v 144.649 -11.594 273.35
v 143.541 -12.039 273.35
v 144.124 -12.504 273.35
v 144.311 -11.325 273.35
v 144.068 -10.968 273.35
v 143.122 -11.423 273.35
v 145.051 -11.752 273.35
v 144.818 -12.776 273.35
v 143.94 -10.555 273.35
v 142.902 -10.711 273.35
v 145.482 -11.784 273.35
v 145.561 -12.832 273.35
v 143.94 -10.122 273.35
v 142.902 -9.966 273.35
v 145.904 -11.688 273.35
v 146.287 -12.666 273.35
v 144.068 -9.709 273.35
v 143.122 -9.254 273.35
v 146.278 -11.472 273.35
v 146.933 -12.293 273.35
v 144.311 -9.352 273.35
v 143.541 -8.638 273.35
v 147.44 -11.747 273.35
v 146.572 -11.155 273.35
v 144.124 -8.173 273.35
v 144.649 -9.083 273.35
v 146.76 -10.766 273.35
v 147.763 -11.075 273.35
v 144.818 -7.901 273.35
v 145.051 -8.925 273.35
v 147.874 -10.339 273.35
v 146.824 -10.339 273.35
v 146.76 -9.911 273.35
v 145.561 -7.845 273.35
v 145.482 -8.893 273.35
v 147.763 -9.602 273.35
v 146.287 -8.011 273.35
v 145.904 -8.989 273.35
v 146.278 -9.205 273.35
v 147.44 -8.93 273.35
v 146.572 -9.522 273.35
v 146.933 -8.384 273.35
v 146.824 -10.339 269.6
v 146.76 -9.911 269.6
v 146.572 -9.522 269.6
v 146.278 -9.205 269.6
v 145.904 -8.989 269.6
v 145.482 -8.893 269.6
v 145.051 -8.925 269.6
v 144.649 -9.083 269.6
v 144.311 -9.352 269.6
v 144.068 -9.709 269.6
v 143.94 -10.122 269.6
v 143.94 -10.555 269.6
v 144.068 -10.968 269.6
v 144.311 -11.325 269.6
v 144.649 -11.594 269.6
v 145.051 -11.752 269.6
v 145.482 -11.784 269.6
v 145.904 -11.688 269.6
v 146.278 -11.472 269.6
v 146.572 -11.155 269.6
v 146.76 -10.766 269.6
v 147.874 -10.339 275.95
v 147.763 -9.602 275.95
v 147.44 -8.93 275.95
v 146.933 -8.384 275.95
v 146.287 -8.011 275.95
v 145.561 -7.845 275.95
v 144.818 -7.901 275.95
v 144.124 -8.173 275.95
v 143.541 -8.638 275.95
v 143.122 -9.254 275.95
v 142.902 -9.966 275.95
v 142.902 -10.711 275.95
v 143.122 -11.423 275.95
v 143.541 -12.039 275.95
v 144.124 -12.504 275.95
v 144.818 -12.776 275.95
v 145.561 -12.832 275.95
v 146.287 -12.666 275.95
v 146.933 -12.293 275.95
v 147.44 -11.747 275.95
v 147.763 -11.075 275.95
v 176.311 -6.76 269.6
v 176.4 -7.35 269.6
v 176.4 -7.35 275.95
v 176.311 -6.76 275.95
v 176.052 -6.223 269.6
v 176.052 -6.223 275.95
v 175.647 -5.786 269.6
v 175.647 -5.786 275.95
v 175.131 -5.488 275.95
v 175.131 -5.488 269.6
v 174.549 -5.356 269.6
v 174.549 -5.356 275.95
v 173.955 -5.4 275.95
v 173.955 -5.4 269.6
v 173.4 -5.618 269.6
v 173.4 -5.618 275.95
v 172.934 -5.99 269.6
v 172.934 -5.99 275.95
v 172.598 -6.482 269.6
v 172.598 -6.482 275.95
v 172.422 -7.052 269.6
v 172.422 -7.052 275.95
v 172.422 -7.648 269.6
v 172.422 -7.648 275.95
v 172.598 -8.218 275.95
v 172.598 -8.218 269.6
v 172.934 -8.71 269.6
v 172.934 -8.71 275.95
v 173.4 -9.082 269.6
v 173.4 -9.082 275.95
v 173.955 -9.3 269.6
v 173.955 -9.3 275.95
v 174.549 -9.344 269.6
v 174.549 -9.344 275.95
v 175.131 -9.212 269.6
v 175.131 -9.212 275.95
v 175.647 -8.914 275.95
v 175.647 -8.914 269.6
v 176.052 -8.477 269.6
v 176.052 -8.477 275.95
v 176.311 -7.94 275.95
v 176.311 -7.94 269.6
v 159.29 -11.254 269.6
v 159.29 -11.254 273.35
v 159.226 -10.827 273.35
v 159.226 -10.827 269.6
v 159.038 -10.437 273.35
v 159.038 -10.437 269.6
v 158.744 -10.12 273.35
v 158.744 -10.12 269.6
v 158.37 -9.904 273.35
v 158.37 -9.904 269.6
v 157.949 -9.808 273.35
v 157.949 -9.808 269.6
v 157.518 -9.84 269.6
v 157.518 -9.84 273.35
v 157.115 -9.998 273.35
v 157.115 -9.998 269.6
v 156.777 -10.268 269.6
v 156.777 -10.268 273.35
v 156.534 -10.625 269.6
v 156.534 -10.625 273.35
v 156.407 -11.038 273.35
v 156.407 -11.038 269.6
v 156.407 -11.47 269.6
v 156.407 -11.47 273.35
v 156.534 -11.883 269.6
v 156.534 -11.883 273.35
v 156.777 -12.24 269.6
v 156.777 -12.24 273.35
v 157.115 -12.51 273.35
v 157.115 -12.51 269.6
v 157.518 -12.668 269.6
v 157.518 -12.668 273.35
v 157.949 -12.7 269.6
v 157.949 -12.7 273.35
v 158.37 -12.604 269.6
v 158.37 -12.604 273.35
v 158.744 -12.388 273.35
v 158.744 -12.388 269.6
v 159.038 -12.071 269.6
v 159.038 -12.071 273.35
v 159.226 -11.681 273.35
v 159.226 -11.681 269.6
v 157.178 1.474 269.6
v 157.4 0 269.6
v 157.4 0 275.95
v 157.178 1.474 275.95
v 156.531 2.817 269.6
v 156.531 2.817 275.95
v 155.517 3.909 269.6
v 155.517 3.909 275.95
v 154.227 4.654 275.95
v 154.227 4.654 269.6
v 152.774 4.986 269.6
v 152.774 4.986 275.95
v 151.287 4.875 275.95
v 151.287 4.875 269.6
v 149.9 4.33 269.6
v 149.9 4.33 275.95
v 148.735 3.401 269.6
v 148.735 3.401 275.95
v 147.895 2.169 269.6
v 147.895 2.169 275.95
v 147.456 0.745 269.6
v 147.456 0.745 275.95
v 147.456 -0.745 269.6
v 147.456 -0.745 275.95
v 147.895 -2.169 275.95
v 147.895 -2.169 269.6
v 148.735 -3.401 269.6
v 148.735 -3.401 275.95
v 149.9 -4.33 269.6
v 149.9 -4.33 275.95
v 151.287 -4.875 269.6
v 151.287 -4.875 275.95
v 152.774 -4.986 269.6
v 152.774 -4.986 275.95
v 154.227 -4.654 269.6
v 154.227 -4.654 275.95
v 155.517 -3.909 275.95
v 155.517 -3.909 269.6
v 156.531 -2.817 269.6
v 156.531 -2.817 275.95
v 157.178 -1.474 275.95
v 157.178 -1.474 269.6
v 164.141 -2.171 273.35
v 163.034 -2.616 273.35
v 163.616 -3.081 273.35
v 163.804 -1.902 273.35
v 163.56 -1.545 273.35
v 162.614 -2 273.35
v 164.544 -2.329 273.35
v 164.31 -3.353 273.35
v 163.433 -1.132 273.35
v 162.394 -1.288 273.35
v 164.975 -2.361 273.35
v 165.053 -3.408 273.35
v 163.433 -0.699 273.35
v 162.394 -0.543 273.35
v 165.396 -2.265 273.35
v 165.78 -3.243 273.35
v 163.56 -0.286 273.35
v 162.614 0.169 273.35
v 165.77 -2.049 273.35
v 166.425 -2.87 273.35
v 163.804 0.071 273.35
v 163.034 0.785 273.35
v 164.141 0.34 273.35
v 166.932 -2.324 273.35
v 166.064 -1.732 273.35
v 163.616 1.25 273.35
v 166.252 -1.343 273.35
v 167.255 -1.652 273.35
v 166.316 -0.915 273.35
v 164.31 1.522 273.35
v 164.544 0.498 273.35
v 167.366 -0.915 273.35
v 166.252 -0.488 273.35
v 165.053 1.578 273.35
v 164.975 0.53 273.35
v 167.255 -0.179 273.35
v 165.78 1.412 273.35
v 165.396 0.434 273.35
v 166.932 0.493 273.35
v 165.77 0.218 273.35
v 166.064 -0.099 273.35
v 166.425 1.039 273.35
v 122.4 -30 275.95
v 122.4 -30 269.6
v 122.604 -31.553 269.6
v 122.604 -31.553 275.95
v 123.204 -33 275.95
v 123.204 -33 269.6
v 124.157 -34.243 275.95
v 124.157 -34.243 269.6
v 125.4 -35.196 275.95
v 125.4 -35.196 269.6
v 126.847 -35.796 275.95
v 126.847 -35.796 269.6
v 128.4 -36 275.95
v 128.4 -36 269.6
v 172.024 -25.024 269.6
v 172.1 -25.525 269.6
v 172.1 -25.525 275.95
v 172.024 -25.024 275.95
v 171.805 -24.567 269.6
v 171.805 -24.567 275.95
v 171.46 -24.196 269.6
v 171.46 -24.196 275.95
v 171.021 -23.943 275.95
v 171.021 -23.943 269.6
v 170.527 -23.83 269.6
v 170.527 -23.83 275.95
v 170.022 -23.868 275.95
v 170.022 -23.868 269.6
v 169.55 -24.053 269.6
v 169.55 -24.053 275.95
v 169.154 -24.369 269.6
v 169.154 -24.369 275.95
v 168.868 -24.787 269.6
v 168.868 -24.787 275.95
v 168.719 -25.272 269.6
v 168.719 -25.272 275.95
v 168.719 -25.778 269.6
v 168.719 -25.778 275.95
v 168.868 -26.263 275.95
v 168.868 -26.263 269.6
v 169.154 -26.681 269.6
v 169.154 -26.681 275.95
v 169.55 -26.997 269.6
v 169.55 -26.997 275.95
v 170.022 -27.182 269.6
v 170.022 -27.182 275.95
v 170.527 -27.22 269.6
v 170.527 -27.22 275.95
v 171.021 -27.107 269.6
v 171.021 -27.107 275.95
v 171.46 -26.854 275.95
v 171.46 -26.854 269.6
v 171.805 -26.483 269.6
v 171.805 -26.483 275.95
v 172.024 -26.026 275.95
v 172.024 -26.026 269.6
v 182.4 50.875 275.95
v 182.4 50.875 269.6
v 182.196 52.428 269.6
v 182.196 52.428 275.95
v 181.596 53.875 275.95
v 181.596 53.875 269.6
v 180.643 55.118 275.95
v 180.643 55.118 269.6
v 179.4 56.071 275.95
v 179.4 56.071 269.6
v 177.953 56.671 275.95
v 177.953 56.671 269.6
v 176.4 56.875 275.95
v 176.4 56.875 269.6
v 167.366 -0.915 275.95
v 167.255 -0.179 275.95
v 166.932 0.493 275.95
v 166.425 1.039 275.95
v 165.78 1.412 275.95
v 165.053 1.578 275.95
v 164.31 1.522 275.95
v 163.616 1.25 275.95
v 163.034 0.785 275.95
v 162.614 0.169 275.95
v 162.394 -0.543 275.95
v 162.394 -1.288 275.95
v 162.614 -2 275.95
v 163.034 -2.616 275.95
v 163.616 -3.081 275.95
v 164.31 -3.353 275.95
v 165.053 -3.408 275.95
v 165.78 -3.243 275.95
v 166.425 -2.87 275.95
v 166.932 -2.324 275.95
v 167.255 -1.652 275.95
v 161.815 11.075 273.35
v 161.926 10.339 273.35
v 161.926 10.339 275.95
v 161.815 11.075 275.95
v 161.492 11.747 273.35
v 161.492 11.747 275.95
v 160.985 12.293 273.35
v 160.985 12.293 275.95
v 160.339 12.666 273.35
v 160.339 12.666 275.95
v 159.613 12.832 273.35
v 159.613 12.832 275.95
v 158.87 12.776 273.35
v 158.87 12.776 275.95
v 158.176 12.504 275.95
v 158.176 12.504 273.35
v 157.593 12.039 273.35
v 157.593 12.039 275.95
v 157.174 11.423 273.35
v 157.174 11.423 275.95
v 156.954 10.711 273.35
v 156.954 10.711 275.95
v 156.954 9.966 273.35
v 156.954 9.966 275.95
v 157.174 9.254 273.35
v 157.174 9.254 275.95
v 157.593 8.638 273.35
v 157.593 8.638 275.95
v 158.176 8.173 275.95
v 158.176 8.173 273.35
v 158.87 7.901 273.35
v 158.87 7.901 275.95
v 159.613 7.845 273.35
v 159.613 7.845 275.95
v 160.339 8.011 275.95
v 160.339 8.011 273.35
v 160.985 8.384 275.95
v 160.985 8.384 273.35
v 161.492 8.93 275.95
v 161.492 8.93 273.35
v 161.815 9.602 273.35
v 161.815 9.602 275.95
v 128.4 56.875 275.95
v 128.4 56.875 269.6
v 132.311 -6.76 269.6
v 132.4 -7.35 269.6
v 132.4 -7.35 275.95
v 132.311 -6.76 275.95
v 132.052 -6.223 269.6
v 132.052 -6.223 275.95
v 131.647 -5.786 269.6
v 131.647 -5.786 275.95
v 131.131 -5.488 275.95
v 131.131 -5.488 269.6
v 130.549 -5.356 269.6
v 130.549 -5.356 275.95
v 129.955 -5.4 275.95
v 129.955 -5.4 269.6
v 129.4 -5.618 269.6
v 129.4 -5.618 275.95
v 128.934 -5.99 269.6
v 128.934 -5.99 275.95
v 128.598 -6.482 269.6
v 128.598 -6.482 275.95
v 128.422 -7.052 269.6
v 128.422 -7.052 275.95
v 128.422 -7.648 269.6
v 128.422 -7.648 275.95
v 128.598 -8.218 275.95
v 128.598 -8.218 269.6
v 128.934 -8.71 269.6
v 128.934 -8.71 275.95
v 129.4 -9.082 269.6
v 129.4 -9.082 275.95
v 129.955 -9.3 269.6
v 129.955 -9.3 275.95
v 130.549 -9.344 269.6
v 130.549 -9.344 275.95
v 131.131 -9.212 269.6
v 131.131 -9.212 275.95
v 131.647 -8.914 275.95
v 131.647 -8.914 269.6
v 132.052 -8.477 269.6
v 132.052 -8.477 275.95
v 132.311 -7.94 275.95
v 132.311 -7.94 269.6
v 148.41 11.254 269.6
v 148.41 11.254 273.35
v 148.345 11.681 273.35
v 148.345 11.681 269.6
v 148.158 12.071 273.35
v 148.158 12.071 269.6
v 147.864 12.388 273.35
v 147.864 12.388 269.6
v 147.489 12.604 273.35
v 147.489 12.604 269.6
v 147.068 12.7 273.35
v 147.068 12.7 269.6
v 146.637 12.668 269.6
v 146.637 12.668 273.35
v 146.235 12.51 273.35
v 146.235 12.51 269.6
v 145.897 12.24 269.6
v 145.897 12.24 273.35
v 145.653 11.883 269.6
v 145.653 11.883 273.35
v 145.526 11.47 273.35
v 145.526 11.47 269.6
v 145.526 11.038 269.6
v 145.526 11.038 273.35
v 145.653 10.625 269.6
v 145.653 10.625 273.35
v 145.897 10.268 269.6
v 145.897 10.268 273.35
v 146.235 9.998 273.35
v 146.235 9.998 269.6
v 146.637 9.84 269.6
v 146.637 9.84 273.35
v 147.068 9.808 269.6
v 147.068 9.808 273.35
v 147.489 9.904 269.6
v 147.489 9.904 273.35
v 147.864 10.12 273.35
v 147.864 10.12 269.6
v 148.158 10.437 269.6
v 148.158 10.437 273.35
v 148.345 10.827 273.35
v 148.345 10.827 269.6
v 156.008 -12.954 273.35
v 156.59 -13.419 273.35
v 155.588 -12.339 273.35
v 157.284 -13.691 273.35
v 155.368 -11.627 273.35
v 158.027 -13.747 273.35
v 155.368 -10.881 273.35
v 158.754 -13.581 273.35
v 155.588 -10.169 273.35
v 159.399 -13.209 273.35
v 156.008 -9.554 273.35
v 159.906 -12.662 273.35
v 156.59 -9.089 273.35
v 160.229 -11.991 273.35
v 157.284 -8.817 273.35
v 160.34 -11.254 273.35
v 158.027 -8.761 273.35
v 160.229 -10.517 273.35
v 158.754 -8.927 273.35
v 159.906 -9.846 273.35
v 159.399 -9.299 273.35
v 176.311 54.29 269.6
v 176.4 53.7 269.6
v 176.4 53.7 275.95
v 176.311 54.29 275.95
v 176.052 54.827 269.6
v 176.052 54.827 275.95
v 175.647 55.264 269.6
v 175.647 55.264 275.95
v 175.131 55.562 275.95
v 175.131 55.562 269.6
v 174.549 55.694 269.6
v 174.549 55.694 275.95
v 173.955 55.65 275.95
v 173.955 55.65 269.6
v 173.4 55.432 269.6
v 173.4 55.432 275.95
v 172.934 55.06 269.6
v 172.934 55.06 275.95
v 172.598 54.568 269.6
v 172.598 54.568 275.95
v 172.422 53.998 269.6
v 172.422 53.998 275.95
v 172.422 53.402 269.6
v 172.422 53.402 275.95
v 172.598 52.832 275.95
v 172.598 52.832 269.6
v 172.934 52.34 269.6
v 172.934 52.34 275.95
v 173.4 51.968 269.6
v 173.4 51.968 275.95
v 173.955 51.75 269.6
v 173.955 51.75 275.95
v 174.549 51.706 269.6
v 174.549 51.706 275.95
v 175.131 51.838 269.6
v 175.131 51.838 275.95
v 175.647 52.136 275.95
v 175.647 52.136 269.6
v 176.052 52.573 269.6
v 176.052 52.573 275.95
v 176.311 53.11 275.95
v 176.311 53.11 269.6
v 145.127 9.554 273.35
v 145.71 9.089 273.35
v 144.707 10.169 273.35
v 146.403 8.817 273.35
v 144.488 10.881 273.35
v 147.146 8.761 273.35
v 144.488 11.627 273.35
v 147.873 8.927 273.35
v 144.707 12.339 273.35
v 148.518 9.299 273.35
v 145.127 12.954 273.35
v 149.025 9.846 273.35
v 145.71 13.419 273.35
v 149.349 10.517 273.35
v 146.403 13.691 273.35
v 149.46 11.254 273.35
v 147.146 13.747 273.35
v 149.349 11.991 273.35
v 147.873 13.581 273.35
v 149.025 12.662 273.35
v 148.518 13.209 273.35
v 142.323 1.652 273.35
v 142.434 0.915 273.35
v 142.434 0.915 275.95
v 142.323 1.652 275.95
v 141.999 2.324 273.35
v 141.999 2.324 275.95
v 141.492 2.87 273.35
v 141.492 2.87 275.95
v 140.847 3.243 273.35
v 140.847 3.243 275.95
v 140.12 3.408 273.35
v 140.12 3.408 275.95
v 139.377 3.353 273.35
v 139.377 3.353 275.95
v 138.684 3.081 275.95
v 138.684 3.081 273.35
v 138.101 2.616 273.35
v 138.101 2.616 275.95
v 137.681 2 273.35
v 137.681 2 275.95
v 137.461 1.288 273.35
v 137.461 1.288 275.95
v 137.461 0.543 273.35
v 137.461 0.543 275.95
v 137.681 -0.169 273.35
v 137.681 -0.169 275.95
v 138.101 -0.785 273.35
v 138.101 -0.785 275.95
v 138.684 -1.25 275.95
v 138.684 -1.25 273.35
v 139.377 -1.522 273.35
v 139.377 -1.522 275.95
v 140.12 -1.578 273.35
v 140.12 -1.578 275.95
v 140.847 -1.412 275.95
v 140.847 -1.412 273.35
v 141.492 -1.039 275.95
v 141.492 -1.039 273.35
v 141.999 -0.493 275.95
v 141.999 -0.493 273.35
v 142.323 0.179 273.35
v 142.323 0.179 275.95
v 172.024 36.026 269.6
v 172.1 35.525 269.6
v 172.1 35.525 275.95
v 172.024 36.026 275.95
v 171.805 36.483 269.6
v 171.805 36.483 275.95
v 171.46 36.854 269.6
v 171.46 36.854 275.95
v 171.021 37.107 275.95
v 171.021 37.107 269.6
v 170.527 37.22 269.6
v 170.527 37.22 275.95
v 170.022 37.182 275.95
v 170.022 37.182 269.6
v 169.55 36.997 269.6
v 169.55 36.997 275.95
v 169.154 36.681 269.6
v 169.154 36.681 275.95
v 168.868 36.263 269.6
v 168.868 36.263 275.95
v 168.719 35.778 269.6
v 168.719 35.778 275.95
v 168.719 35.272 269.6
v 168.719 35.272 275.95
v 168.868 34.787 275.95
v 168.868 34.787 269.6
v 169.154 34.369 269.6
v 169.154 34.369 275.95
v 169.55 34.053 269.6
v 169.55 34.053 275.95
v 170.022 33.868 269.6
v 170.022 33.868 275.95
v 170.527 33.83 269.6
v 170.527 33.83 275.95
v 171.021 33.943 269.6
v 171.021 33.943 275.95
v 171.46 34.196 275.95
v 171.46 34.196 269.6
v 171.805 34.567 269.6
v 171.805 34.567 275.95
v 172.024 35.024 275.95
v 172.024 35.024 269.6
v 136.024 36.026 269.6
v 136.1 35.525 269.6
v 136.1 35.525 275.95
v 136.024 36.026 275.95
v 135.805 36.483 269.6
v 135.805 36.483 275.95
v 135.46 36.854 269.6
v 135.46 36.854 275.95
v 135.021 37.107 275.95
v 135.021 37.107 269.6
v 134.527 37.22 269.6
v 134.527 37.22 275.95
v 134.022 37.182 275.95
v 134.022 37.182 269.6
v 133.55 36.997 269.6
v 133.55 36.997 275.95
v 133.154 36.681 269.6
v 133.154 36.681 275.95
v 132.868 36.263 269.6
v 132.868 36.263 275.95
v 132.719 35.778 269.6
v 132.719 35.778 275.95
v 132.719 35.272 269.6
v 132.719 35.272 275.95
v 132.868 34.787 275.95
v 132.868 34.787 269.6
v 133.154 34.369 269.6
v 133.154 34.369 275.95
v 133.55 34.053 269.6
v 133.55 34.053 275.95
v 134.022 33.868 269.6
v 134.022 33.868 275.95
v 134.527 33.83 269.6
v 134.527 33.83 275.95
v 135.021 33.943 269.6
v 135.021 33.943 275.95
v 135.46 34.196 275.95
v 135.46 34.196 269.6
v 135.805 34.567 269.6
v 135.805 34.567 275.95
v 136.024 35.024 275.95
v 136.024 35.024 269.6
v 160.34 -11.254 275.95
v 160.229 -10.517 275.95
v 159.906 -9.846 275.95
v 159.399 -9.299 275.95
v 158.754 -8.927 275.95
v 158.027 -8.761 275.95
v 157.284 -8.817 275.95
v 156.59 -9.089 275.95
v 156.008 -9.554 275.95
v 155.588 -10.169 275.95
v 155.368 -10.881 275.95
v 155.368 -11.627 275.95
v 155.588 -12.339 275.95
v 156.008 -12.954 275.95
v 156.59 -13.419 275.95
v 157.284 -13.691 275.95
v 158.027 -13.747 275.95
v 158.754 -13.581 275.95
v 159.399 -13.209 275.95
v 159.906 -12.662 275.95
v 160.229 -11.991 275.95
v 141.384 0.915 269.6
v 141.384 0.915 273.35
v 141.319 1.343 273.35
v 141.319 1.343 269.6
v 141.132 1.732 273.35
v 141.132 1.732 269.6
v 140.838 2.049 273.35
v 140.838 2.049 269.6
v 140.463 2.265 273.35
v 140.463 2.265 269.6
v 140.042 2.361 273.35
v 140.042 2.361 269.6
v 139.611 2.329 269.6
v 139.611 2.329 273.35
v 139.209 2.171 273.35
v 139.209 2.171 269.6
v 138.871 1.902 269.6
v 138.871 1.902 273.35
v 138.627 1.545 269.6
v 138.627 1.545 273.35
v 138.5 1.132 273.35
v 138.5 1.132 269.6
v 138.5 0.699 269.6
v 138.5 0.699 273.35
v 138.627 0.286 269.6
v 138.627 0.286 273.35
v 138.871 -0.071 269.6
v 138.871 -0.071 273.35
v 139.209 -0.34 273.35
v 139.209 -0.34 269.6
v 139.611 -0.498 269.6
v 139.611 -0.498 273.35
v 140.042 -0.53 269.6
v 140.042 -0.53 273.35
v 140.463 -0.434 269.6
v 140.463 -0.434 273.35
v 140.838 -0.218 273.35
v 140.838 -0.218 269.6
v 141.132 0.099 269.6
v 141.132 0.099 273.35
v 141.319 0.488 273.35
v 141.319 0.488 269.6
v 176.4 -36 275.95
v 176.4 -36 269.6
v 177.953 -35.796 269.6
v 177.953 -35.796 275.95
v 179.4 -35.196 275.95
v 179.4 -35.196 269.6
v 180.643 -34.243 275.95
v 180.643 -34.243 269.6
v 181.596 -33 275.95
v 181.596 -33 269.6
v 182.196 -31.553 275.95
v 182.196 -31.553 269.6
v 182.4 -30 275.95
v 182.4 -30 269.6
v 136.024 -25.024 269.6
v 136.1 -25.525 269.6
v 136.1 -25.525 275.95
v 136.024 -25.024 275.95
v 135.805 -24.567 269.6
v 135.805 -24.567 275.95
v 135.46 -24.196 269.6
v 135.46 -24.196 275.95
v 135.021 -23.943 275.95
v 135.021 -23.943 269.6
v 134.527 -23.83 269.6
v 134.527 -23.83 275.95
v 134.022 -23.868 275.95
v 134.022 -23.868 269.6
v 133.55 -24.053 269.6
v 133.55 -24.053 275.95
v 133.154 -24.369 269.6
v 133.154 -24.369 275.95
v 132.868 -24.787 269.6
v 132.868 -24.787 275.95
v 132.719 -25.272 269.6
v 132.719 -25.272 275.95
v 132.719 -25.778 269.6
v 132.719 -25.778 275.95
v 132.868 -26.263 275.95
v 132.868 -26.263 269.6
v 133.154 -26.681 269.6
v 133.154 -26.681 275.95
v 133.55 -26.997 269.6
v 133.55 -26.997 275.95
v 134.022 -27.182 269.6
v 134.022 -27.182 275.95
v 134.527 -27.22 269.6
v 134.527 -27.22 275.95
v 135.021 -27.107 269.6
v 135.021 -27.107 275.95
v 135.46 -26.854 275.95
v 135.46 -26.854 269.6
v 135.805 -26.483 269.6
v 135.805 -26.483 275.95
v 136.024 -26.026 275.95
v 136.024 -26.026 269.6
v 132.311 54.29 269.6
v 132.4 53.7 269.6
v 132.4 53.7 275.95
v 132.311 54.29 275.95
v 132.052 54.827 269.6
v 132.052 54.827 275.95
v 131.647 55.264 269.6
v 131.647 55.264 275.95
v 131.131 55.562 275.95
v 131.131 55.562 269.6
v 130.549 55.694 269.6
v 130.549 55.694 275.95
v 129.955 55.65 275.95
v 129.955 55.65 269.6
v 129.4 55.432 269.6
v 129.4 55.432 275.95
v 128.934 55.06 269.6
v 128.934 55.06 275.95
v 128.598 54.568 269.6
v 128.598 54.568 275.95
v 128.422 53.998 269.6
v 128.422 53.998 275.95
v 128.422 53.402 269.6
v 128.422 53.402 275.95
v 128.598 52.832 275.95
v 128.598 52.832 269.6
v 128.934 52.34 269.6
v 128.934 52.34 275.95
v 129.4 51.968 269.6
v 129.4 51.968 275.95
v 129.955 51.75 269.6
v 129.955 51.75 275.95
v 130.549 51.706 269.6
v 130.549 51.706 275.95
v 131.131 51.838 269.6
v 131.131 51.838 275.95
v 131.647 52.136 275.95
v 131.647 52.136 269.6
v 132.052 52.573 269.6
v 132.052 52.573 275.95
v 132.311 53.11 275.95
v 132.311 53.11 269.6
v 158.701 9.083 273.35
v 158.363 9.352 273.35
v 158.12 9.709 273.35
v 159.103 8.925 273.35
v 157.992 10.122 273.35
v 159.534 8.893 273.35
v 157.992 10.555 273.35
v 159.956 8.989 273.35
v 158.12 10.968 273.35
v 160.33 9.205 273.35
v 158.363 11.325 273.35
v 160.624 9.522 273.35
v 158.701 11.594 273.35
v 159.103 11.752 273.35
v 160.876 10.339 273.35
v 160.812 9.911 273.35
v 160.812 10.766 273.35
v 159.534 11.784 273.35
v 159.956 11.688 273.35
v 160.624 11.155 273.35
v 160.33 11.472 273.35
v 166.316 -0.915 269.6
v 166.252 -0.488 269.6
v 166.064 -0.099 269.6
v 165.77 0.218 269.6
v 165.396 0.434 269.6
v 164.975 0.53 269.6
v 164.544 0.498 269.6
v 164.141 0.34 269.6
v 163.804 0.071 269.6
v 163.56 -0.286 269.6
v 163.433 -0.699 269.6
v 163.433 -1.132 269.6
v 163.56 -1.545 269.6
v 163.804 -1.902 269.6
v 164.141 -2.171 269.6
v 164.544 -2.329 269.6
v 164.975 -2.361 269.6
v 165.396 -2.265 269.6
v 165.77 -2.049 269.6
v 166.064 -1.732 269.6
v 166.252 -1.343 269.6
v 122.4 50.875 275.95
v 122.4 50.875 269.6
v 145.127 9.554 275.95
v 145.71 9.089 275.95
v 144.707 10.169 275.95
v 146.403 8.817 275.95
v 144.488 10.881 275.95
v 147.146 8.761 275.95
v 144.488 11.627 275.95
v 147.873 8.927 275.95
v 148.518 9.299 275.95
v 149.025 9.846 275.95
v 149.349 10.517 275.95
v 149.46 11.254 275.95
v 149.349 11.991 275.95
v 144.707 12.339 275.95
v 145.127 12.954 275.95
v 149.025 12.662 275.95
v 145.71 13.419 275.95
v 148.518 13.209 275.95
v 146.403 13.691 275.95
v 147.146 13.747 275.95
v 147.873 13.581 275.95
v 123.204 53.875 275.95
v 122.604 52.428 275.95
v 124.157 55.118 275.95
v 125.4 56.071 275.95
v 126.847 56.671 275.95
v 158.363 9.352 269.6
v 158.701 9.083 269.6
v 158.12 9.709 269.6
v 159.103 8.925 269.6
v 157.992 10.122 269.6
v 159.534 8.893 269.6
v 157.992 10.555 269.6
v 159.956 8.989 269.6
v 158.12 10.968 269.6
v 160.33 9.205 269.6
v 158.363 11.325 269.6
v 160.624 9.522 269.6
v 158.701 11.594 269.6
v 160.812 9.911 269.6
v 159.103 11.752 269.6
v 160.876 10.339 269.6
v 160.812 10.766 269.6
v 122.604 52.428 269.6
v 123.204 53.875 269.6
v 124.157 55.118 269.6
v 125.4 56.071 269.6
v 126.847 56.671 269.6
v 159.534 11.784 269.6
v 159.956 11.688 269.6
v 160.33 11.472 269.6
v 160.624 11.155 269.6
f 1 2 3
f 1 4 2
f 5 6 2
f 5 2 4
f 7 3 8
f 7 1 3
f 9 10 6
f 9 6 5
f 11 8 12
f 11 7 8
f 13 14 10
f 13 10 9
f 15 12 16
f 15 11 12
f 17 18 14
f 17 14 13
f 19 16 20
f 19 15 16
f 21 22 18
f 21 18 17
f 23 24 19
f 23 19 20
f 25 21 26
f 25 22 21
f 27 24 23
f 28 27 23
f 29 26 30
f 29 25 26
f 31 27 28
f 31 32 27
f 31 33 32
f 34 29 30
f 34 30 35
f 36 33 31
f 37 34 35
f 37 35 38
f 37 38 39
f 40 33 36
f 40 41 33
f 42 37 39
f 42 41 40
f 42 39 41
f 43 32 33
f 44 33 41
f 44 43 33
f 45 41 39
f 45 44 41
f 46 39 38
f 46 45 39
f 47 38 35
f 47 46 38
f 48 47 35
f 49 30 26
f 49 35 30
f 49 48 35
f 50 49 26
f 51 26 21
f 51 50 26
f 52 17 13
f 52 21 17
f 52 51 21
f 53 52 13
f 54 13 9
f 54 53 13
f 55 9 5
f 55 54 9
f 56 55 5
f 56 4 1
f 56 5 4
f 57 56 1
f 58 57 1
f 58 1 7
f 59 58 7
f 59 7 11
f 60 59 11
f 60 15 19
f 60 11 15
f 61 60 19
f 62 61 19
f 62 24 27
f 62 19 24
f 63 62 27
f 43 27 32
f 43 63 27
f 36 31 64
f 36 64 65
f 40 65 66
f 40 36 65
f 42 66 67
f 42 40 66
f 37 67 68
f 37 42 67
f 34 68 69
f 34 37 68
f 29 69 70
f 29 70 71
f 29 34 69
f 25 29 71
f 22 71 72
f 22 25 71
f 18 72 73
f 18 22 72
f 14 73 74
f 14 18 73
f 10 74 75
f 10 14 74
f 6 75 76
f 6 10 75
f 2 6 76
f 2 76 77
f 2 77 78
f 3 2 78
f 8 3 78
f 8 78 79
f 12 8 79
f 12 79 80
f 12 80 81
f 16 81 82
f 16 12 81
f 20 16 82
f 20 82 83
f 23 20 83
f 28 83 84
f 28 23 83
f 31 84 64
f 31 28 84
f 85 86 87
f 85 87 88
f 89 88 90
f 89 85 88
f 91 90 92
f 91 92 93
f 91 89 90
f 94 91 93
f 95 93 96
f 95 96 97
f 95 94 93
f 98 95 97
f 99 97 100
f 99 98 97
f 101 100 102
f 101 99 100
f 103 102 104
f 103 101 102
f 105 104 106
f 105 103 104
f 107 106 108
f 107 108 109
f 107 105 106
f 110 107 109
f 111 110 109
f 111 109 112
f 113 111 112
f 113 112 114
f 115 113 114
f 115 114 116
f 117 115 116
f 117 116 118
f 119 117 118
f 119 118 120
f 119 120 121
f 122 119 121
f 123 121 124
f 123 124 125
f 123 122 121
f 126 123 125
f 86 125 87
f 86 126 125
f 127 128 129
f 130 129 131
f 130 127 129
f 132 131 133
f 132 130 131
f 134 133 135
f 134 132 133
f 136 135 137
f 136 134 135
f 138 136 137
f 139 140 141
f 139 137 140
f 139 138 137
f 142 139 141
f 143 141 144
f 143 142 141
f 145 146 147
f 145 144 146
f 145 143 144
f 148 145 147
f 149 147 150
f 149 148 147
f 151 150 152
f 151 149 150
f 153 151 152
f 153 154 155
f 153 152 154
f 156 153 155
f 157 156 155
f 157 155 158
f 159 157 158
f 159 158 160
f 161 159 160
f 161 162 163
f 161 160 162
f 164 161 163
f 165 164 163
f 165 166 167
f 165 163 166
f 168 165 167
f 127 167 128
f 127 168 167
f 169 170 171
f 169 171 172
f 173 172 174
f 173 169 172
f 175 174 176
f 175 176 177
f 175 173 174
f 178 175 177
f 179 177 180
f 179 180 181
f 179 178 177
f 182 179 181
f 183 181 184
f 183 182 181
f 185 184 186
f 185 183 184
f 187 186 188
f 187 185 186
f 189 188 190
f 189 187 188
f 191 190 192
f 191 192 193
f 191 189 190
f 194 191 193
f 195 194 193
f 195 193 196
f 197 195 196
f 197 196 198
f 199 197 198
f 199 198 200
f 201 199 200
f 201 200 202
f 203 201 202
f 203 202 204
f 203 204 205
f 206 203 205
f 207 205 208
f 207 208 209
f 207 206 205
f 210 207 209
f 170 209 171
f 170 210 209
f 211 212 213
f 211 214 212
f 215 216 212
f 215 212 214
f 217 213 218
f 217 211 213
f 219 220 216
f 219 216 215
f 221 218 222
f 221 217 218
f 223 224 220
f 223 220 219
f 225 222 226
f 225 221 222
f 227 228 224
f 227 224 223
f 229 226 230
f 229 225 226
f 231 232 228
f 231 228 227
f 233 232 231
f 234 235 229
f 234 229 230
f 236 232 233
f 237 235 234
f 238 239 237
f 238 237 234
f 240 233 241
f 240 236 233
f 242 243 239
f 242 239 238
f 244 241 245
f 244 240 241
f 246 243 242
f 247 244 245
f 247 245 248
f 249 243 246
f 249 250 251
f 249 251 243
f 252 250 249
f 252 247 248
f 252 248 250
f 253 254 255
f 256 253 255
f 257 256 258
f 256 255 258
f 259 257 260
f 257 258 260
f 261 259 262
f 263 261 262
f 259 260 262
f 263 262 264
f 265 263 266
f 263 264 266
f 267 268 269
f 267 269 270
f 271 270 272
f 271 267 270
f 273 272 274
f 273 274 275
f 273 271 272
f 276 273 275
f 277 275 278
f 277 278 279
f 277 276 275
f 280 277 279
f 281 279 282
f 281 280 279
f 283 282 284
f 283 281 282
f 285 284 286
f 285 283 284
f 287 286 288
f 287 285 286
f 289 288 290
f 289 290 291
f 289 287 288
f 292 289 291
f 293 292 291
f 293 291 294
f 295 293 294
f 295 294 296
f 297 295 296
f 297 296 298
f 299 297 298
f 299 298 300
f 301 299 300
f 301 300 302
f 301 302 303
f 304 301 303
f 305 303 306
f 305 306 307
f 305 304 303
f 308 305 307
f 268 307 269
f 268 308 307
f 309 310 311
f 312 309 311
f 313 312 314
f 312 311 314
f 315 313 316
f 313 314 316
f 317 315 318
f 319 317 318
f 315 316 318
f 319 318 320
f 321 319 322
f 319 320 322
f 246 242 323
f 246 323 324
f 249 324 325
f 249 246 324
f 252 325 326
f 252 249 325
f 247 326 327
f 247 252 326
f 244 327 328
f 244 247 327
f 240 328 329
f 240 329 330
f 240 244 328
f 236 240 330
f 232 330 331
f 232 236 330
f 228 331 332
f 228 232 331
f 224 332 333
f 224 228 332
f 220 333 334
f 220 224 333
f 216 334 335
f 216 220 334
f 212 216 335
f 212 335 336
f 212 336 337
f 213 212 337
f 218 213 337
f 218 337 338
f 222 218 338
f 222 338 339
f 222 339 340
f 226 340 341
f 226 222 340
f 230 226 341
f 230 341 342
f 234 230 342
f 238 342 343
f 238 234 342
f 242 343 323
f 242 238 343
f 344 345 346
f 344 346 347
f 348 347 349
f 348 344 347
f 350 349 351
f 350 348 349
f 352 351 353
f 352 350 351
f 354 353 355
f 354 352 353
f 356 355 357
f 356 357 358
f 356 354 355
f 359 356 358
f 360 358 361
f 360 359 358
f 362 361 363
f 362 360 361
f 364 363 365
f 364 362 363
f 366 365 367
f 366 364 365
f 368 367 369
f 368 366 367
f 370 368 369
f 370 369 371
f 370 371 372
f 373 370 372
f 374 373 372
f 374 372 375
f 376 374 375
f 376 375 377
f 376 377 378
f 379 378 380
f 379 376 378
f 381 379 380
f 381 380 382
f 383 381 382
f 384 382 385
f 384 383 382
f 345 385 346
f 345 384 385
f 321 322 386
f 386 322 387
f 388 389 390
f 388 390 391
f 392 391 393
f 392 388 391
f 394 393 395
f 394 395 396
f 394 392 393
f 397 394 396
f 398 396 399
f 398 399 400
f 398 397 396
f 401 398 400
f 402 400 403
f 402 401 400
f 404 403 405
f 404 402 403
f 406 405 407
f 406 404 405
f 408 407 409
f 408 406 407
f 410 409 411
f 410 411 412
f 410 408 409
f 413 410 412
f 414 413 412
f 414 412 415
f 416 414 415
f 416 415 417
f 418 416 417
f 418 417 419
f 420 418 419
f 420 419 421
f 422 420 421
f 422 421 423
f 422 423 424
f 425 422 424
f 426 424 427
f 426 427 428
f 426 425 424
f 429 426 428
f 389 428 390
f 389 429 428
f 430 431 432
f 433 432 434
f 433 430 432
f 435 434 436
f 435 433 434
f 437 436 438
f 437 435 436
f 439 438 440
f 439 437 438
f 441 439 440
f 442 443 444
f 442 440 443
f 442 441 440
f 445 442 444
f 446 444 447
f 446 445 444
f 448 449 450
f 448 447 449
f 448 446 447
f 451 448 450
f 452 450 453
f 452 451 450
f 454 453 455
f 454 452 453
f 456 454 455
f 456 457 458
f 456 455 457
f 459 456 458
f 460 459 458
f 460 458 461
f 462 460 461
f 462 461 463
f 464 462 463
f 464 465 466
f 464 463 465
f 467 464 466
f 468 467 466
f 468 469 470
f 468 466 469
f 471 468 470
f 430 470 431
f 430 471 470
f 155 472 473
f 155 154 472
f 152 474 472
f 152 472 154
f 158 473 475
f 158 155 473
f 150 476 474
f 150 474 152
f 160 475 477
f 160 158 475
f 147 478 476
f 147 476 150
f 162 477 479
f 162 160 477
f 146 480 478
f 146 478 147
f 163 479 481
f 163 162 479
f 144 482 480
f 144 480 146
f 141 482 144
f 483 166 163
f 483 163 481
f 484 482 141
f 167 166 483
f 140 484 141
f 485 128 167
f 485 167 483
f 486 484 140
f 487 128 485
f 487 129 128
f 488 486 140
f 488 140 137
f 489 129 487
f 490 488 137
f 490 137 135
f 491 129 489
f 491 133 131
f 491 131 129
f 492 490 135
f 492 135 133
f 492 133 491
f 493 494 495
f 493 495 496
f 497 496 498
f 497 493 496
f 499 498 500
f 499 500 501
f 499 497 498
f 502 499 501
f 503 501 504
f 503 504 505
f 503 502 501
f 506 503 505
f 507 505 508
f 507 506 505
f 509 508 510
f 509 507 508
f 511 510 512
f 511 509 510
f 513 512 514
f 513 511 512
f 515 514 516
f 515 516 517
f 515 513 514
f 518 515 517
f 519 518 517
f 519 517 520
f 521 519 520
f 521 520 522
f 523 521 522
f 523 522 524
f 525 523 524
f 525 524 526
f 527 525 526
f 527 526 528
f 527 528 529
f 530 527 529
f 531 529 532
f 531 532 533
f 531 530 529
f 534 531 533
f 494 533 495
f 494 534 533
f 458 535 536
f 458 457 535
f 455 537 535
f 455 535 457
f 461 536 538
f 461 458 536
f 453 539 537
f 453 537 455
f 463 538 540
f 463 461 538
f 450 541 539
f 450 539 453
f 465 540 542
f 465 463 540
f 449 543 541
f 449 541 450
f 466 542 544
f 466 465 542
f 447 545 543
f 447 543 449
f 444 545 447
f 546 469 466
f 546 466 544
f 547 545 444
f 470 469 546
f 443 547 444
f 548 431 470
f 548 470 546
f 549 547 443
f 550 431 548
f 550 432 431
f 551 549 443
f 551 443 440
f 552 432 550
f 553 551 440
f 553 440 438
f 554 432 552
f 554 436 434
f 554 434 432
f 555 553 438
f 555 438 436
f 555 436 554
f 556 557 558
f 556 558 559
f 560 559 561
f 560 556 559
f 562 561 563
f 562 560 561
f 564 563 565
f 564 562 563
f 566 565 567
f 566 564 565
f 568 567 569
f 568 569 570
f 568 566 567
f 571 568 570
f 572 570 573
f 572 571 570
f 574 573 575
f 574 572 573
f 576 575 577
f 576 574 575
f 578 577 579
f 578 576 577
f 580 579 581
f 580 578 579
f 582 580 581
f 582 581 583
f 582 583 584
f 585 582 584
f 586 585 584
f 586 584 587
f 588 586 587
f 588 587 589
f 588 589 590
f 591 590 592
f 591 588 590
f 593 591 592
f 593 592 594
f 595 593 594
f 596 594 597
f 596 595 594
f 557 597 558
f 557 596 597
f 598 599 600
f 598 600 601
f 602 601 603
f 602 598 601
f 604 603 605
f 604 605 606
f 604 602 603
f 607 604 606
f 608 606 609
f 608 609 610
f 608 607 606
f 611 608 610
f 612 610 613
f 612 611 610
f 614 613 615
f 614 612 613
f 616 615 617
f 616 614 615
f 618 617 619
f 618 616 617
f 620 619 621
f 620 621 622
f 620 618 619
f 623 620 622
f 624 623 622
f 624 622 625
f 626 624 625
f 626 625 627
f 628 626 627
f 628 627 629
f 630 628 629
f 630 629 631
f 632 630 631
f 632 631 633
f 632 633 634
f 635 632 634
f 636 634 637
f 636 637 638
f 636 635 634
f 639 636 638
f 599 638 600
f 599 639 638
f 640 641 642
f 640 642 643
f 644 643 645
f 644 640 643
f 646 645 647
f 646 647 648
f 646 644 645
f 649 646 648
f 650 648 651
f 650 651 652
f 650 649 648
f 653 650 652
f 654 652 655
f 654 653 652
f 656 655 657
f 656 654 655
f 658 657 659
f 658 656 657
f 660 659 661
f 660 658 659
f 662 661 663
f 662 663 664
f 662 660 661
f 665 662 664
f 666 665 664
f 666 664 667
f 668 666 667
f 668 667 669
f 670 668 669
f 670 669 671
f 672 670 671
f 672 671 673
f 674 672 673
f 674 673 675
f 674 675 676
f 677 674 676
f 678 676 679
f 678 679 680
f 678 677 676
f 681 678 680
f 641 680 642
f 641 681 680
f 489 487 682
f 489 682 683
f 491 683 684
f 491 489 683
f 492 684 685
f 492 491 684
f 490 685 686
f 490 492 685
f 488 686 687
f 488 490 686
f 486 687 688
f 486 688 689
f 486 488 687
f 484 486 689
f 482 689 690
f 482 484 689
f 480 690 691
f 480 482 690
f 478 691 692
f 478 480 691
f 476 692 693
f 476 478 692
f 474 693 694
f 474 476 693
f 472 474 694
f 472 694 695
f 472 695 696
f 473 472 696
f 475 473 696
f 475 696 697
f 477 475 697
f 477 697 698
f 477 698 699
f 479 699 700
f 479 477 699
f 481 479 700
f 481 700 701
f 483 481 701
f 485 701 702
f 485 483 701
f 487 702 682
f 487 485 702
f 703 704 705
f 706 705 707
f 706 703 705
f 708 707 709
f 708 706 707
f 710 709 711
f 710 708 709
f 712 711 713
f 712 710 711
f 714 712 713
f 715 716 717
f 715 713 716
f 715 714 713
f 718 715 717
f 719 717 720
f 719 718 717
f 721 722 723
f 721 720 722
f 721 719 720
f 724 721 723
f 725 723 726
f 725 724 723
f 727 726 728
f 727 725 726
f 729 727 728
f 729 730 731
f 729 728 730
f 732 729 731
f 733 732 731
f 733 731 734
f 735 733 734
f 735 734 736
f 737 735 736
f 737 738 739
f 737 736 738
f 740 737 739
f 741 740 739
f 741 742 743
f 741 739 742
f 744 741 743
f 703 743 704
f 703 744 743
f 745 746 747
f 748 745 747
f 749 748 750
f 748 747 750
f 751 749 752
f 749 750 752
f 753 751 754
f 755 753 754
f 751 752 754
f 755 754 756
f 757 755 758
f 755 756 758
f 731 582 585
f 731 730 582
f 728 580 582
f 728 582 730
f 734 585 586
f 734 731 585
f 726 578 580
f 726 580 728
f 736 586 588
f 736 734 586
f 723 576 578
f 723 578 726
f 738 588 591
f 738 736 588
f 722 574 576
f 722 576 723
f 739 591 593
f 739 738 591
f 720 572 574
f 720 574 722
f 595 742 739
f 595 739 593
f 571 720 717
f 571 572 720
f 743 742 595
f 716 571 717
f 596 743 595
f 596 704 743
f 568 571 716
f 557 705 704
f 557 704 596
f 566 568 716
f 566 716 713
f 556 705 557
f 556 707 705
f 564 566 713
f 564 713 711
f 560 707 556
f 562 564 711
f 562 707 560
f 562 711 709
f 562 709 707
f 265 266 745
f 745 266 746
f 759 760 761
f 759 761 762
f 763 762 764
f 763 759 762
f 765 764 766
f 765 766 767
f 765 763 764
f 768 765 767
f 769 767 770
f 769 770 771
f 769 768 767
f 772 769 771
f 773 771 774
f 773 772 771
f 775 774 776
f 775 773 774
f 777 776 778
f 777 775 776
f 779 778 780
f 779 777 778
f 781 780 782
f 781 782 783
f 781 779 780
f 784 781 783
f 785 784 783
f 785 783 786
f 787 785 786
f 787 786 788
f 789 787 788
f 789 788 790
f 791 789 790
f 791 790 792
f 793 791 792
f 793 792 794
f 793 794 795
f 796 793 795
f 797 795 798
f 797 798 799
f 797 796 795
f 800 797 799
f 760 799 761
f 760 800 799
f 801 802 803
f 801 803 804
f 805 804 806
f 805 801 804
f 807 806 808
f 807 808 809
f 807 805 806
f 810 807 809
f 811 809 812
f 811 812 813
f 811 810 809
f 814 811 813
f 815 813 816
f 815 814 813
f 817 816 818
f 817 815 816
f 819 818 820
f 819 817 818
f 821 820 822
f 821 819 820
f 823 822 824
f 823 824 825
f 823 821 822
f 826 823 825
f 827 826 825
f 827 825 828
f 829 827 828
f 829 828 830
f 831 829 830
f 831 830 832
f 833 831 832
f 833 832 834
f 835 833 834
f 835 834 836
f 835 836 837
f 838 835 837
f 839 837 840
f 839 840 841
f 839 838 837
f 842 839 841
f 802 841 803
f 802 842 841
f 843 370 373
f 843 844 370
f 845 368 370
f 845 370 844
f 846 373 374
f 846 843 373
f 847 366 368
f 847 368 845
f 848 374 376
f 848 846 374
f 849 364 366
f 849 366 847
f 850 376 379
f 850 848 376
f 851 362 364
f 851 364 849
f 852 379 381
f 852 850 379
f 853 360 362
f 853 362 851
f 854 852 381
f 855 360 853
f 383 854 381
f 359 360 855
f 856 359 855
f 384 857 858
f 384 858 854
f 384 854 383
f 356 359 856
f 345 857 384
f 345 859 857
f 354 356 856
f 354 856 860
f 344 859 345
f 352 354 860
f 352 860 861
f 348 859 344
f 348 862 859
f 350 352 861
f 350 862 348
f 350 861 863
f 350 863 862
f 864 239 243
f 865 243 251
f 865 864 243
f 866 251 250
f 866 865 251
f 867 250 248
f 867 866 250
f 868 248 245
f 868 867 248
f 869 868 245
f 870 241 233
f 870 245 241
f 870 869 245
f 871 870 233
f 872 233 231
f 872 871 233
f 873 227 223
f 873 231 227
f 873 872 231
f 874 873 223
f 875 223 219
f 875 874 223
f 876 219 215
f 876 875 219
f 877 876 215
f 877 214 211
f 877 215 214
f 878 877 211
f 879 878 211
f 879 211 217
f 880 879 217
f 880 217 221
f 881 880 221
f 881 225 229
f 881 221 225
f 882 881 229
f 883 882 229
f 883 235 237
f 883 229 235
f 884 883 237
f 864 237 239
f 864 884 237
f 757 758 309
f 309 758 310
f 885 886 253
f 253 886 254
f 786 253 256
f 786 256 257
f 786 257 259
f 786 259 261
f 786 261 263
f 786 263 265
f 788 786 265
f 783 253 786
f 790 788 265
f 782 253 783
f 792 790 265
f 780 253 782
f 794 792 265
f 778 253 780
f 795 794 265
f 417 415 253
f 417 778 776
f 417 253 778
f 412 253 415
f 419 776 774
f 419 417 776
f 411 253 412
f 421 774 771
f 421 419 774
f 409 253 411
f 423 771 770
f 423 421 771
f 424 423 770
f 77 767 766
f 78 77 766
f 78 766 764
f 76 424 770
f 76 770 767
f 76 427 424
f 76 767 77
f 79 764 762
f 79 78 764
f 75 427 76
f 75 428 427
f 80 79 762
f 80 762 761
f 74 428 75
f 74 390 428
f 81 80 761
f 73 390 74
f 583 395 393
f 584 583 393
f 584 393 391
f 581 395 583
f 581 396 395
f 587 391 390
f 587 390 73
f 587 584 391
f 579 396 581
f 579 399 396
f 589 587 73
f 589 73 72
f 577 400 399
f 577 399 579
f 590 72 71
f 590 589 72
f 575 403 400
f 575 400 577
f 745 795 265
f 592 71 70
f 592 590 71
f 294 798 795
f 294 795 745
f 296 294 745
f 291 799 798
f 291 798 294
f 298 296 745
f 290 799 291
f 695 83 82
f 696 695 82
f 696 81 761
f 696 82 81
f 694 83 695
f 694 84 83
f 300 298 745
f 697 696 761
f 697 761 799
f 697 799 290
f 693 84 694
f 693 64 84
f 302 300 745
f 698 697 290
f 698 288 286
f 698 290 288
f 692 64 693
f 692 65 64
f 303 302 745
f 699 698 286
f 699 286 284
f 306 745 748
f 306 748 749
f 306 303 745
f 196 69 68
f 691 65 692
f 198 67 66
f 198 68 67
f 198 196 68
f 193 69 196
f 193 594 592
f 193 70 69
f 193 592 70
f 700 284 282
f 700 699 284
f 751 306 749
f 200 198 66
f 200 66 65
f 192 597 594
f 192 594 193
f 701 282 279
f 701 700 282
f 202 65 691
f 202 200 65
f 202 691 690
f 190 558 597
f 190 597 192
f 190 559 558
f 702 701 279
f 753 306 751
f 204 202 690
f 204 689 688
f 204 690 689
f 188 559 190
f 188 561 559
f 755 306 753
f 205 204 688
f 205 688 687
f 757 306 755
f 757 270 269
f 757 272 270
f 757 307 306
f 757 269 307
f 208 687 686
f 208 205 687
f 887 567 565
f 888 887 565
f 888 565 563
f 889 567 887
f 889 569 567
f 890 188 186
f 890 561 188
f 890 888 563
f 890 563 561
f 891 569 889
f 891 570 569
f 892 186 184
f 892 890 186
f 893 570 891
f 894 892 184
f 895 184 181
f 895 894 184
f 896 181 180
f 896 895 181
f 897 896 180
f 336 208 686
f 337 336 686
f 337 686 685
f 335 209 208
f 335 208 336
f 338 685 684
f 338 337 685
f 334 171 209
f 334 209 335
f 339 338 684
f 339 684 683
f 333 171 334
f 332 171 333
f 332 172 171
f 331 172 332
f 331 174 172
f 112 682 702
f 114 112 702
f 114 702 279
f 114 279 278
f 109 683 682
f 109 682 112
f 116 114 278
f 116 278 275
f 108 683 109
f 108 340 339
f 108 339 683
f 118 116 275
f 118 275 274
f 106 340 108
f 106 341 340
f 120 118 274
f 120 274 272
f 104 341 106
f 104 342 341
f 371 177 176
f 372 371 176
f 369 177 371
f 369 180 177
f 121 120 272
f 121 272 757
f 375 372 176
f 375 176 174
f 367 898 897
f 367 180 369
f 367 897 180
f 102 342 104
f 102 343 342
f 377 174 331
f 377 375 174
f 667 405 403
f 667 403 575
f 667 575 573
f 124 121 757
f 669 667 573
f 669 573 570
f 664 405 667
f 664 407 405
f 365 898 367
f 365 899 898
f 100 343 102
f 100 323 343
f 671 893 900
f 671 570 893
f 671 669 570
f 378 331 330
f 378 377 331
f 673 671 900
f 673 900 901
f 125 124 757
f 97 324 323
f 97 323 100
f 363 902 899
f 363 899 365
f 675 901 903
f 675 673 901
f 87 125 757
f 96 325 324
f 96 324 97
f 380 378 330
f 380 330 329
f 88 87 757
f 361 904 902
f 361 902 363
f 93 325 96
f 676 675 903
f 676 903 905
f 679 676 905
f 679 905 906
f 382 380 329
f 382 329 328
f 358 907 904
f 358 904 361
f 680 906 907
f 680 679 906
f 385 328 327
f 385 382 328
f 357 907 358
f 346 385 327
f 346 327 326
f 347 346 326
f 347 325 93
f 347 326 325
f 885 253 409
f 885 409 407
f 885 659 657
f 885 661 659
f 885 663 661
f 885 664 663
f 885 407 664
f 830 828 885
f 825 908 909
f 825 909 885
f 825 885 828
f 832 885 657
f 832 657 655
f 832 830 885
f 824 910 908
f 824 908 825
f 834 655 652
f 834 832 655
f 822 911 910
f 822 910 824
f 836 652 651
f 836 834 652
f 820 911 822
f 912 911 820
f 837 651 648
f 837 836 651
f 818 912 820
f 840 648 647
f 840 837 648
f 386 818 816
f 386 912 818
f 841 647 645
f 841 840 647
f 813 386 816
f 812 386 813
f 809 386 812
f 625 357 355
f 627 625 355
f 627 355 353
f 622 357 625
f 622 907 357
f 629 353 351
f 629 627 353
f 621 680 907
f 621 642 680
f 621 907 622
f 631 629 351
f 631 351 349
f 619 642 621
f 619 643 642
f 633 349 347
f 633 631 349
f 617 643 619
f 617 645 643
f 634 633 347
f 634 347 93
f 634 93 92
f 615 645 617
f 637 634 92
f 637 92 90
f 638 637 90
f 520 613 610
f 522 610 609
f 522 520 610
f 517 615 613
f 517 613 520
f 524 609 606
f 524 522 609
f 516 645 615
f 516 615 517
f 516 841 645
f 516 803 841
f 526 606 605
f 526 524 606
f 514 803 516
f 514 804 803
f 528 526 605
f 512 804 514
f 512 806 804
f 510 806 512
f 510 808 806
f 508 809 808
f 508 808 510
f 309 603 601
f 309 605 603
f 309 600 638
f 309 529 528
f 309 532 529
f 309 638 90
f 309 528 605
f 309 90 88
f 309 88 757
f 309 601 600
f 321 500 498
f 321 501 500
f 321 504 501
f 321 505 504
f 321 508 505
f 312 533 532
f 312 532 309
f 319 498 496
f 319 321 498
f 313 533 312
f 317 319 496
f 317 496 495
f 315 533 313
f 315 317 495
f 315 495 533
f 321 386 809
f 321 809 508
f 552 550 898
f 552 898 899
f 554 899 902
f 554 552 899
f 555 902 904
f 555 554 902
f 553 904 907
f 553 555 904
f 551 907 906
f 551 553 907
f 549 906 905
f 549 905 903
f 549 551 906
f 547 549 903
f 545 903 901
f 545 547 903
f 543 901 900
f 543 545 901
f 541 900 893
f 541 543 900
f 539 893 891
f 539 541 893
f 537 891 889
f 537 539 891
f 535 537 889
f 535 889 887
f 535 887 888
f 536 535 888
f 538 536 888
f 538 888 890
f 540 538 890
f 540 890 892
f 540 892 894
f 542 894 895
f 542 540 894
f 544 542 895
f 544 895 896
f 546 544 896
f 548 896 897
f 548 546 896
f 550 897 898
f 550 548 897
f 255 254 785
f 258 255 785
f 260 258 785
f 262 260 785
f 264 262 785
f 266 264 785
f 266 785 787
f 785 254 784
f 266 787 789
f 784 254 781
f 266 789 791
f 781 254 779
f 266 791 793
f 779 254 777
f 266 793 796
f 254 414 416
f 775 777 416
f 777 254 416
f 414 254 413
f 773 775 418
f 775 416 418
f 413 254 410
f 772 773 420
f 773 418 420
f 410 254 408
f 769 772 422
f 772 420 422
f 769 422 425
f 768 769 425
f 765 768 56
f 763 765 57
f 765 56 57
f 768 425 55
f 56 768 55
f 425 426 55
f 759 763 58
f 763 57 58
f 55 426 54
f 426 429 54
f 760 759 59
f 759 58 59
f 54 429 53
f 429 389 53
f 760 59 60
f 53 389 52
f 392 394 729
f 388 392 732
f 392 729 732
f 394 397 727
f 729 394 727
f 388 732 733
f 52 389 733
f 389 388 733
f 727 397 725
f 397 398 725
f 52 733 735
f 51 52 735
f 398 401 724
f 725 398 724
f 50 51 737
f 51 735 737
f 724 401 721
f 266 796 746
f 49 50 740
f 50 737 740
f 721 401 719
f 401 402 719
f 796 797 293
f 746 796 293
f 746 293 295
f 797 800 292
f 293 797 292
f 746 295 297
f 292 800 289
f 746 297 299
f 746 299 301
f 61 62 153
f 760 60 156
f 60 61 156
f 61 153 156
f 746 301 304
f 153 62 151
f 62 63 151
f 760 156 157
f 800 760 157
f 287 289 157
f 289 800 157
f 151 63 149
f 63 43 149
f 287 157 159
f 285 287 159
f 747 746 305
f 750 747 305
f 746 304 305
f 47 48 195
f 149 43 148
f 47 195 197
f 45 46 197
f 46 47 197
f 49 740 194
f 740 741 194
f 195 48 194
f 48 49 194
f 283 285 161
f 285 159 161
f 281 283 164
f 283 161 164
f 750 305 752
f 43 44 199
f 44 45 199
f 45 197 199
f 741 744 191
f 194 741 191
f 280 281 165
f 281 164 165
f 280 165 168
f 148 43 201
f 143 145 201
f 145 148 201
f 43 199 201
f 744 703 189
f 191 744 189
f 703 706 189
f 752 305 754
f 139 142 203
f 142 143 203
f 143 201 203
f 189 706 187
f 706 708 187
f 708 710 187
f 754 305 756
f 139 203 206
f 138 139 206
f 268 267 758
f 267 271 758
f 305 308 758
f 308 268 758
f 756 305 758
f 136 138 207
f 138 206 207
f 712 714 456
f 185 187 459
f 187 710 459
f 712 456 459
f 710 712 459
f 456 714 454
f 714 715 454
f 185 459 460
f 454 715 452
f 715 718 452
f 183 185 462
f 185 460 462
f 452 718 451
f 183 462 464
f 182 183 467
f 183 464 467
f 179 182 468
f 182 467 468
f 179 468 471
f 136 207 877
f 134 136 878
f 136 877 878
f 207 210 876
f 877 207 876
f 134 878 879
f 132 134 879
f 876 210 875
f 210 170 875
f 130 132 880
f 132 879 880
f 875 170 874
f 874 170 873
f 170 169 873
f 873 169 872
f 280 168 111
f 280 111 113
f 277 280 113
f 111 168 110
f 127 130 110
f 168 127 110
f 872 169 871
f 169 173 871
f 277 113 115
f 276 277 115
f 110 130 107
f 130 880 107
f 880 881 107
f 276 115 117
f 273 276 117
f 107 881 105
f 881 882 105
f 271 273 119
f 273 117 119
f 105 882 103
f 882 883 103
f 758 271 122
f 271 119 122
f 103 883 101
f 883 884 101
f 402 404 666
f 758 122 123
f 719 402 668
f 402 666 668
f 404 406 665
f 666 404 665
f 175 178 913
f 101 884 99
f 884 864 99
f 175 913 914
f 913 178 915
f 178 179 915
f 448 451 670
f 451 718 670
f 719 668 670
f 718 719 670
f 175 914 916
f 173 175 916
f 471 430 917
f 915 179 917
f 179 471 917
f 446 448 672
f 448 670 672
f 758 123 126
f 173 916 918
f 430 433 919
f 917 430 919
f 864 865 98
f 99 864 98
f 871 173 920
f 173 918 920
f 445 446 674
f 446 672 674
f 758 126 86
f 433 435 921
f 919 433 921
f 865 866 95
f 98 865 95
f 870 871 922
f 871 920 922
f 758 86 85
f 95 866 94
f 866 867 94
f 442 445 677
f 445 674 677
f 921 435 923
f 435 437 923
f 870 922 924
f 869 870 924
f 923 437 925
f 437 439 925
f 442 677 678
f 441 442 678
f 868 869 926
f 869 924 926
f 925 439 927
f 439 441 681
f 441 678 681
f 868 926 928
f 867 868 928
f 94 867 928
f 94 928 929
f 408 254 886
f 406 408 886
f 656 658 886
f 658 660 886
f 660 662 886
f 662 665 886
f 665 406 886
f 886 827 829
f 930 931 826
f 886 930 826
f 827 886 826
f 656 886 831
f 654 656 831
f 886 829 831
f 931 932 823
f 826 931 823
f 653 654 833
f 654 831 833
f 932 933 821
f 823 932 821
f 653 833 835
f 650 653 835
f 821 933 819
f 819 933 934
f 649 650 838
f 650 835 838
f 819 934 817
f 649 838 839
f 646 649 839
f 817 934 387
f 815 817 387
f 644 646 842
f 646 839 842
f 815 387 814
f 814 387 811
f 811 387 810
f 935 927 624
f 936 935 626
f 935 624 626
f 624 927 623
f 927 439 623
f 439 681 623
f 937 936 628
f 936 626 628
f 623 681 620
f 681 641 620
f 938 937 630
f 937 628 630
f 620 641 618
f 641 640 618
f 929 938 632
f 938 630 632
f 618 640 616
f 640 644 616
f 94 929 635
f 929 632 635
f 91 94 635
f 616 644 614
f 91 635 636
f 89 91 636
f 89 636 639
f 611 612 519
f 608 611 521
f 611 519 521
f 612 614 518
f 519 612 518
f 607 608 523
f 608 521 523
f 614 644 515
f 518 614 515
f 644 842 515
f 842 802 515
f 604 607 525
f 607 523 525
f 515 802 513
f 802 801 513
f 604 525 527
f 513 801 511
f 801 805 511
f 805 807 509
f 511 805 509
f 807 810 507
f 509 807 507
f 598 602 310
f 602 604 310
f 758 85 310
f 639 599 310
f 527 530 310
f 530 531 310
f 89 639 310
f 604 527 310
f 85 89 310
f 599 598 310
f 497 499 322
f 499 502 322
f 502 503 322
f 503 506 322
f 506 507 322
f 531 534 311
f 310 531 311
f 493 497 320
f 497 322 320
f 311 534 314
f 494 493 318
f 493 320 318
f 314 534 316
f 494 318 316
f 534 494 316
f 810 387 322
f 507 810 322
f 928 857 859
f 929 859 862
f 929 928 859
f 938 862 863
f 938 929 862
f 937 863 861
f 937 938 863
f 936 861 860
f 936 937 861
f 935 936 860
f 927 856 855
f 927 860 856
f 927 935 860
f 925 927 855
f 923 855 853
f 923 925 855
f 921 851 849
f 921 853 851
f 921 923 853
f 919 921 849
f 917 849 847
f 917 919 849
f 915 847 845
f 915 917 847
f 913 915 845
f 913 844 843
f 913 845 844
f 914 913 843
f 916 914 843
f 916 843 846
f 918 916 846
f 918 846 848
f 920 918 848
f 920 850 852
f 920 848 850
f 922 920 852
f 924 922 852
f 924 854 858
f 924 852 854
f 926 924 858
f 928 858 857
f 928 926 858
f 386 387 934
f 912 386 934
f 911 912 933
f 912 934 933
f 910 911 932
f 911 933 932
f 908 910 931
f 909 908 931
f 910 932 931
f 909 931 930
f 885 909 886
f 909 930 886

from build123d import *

# Parameters (mm, degrees)
DISCO_1_4IN_START                     = 269.6
DISCO_1_4IN_DEPTH                     = 6.35
BARRENOS_M4_ESCUADRAS_PASADORES_START = 269.6
CROQUIS14_R                           = 1.45
CROQUIS14_R_2                         = 5
CROQUIS14_R_3                         = 1.25
CROQUIS14_R_4                         = 2
BARRENOS_M4_ESCUADRAS_PASADORES_DEPTH = 6.35
REFRENTADO_M2_5_START                 = 273.35
CROQUIS15_R                           = 2.5
REFRENTADO_M2_5_DEPTH                 = 2.6
PASO_M3_ESCUADRAS_TUERCA_START        = 269.6
CROQUIS16_R                           = 1.7
PASO_M3_ESCUADRAS_TUERCA_DEPTH        = 6.35


with BuildPart() as part:
    # Croquis13 → Disco_1-4in (new body)
    with BuildSketch(Plane.XY.offset(DISCO_1_4IN_START)):
        with BuildLine():
            Line((128.4, -36), (176.4, -36))
            ThreePointArc((176.4, -36), (180.642640687, -34.242640687), (182.4, -30))
            Line((182.4, -30), (182.4, 50.875))
            ThreePointArc((182.4, 50.875), (180.642640687, 55.117640687), (176.4, 56.875))
            Line((176.4, 56.875), (128.4, 56.875))
            ThreePointArc((128.4, 56.875), (124.157359313, 55.117640687), (122.4, 50.875))
            Line((122.4, 50.875), (122.4, -30))
            ThreePointArc((122.4, -30), (124.157359313, -34.242640687), (128.4, -36))
        make_face()
    extrude(amount=DISCO_1_4IN_DEPTH)

    # Croquis14 → Barrenos_M4_escuadras_pasadores (cut)
    with BuildSketch(Plane.XY.offset(BARRENOS_M4_ESCUADRAS_PASADORES_START)):
        with Locations((159.426042223, 10.338507178)):
            Circle(CROQUIS14_R)
        with Locations((146.959611258, 11.253984643)):
            Circle(CROQUIS14_R)
        with Locations((139.933569035, 0.915477464)):
            Circle(CROQUIS14_R)
        with Locations((145.373957777, -10.338507178)):
            Circle(CROQUIS14_R)
        with Locations((157.840388742, -11.253984643)):
            Circle(CROQUIS14_R)
        with Locations((164.866430965, -0.915477464)):
            Circle(CROQUIS14_R)
        with Locations((152.4, 0)):
            Circle(CROQUIS14_R_2)
        with Locations((134.4, 35.525)):
            Circle(CROQUIS14_R_3)
        with Locations((134.4, -25.525)):
            Circle(CROQUIS14_R_3)
        with Locations((170.4, 35.525)):
            Circle(CROQUIS14_R_3)
        with Locations((170.4, -25.525)):
            Circle(CROQUIS14_R_3)
        with Locations((130.4, 53.7)):
            Circle(CROQUIS14_R_4)
        with Locations((130.4, -7.35)):
            Circle(CROQUIS14_R_4)
        with Locations((174.4, 53.7)):
            Circle(CROQUIS14_R_4)
        with Locations((174.4, -7.35)):
            Circle(CROQUIS14_R_4)
    extrude(amount=BARRENOS_M4_ESCUADRAS_PASADORES_DEPTH, mode=Mode.SUBTRACT)

    # Croquis15 → Refrentado_M2-5 (cut)
    with BuildSketch(Plane.XY.offset(REFRENTADO_M2_5_START)):
        with Locations((159.426042223, 10.338507178)):
            Circle(CROQUIS15_R)
        with Locations((146.959611258, 11.253984643)):
            Circle(CROQUIS15_R)
        with Locations((139.933569035, 0.915477464)):
            Circle(CROQUIS15_R)
        with Locations((145.373957777, -10.338507178)):
            Circle(CROQUIS15_R)
        with Locations((157.840388742, -11.253984643)):
            Circle(CROQUIS15_R)
        with Locations((164.866430965, -0.915477464)):
            Circle(CROQUIS15_R)
    extrude(amount=REFRENTADO_M2_5_DEPTH, mode=Mode.SUBTRACT)

    # Croquis16 → Paso_M3_escuadras_tuerca (cut)
    with BuildSketch(Plane.XY.offset(PASO_M3_ESCUADRAS_TUERCA_START)):
        with Locations((134.4, 35.525)):
            Circle(CROQUIS16_R)
        with Locations((134.4, -25.525)):
            Circle(CROQUIS16_R)
        with Locations((170.4, 35.525)):
            Circle(CROQUIS16_R)
        with Locations((170.4, -25.525)):
            Circle(CROQUIS16_R)
    extrude(amount=PASO_M3_ESCUADRAS_TUERCA_DEPTH, mode=Mode.SUBTRACT)


solid = part.part
